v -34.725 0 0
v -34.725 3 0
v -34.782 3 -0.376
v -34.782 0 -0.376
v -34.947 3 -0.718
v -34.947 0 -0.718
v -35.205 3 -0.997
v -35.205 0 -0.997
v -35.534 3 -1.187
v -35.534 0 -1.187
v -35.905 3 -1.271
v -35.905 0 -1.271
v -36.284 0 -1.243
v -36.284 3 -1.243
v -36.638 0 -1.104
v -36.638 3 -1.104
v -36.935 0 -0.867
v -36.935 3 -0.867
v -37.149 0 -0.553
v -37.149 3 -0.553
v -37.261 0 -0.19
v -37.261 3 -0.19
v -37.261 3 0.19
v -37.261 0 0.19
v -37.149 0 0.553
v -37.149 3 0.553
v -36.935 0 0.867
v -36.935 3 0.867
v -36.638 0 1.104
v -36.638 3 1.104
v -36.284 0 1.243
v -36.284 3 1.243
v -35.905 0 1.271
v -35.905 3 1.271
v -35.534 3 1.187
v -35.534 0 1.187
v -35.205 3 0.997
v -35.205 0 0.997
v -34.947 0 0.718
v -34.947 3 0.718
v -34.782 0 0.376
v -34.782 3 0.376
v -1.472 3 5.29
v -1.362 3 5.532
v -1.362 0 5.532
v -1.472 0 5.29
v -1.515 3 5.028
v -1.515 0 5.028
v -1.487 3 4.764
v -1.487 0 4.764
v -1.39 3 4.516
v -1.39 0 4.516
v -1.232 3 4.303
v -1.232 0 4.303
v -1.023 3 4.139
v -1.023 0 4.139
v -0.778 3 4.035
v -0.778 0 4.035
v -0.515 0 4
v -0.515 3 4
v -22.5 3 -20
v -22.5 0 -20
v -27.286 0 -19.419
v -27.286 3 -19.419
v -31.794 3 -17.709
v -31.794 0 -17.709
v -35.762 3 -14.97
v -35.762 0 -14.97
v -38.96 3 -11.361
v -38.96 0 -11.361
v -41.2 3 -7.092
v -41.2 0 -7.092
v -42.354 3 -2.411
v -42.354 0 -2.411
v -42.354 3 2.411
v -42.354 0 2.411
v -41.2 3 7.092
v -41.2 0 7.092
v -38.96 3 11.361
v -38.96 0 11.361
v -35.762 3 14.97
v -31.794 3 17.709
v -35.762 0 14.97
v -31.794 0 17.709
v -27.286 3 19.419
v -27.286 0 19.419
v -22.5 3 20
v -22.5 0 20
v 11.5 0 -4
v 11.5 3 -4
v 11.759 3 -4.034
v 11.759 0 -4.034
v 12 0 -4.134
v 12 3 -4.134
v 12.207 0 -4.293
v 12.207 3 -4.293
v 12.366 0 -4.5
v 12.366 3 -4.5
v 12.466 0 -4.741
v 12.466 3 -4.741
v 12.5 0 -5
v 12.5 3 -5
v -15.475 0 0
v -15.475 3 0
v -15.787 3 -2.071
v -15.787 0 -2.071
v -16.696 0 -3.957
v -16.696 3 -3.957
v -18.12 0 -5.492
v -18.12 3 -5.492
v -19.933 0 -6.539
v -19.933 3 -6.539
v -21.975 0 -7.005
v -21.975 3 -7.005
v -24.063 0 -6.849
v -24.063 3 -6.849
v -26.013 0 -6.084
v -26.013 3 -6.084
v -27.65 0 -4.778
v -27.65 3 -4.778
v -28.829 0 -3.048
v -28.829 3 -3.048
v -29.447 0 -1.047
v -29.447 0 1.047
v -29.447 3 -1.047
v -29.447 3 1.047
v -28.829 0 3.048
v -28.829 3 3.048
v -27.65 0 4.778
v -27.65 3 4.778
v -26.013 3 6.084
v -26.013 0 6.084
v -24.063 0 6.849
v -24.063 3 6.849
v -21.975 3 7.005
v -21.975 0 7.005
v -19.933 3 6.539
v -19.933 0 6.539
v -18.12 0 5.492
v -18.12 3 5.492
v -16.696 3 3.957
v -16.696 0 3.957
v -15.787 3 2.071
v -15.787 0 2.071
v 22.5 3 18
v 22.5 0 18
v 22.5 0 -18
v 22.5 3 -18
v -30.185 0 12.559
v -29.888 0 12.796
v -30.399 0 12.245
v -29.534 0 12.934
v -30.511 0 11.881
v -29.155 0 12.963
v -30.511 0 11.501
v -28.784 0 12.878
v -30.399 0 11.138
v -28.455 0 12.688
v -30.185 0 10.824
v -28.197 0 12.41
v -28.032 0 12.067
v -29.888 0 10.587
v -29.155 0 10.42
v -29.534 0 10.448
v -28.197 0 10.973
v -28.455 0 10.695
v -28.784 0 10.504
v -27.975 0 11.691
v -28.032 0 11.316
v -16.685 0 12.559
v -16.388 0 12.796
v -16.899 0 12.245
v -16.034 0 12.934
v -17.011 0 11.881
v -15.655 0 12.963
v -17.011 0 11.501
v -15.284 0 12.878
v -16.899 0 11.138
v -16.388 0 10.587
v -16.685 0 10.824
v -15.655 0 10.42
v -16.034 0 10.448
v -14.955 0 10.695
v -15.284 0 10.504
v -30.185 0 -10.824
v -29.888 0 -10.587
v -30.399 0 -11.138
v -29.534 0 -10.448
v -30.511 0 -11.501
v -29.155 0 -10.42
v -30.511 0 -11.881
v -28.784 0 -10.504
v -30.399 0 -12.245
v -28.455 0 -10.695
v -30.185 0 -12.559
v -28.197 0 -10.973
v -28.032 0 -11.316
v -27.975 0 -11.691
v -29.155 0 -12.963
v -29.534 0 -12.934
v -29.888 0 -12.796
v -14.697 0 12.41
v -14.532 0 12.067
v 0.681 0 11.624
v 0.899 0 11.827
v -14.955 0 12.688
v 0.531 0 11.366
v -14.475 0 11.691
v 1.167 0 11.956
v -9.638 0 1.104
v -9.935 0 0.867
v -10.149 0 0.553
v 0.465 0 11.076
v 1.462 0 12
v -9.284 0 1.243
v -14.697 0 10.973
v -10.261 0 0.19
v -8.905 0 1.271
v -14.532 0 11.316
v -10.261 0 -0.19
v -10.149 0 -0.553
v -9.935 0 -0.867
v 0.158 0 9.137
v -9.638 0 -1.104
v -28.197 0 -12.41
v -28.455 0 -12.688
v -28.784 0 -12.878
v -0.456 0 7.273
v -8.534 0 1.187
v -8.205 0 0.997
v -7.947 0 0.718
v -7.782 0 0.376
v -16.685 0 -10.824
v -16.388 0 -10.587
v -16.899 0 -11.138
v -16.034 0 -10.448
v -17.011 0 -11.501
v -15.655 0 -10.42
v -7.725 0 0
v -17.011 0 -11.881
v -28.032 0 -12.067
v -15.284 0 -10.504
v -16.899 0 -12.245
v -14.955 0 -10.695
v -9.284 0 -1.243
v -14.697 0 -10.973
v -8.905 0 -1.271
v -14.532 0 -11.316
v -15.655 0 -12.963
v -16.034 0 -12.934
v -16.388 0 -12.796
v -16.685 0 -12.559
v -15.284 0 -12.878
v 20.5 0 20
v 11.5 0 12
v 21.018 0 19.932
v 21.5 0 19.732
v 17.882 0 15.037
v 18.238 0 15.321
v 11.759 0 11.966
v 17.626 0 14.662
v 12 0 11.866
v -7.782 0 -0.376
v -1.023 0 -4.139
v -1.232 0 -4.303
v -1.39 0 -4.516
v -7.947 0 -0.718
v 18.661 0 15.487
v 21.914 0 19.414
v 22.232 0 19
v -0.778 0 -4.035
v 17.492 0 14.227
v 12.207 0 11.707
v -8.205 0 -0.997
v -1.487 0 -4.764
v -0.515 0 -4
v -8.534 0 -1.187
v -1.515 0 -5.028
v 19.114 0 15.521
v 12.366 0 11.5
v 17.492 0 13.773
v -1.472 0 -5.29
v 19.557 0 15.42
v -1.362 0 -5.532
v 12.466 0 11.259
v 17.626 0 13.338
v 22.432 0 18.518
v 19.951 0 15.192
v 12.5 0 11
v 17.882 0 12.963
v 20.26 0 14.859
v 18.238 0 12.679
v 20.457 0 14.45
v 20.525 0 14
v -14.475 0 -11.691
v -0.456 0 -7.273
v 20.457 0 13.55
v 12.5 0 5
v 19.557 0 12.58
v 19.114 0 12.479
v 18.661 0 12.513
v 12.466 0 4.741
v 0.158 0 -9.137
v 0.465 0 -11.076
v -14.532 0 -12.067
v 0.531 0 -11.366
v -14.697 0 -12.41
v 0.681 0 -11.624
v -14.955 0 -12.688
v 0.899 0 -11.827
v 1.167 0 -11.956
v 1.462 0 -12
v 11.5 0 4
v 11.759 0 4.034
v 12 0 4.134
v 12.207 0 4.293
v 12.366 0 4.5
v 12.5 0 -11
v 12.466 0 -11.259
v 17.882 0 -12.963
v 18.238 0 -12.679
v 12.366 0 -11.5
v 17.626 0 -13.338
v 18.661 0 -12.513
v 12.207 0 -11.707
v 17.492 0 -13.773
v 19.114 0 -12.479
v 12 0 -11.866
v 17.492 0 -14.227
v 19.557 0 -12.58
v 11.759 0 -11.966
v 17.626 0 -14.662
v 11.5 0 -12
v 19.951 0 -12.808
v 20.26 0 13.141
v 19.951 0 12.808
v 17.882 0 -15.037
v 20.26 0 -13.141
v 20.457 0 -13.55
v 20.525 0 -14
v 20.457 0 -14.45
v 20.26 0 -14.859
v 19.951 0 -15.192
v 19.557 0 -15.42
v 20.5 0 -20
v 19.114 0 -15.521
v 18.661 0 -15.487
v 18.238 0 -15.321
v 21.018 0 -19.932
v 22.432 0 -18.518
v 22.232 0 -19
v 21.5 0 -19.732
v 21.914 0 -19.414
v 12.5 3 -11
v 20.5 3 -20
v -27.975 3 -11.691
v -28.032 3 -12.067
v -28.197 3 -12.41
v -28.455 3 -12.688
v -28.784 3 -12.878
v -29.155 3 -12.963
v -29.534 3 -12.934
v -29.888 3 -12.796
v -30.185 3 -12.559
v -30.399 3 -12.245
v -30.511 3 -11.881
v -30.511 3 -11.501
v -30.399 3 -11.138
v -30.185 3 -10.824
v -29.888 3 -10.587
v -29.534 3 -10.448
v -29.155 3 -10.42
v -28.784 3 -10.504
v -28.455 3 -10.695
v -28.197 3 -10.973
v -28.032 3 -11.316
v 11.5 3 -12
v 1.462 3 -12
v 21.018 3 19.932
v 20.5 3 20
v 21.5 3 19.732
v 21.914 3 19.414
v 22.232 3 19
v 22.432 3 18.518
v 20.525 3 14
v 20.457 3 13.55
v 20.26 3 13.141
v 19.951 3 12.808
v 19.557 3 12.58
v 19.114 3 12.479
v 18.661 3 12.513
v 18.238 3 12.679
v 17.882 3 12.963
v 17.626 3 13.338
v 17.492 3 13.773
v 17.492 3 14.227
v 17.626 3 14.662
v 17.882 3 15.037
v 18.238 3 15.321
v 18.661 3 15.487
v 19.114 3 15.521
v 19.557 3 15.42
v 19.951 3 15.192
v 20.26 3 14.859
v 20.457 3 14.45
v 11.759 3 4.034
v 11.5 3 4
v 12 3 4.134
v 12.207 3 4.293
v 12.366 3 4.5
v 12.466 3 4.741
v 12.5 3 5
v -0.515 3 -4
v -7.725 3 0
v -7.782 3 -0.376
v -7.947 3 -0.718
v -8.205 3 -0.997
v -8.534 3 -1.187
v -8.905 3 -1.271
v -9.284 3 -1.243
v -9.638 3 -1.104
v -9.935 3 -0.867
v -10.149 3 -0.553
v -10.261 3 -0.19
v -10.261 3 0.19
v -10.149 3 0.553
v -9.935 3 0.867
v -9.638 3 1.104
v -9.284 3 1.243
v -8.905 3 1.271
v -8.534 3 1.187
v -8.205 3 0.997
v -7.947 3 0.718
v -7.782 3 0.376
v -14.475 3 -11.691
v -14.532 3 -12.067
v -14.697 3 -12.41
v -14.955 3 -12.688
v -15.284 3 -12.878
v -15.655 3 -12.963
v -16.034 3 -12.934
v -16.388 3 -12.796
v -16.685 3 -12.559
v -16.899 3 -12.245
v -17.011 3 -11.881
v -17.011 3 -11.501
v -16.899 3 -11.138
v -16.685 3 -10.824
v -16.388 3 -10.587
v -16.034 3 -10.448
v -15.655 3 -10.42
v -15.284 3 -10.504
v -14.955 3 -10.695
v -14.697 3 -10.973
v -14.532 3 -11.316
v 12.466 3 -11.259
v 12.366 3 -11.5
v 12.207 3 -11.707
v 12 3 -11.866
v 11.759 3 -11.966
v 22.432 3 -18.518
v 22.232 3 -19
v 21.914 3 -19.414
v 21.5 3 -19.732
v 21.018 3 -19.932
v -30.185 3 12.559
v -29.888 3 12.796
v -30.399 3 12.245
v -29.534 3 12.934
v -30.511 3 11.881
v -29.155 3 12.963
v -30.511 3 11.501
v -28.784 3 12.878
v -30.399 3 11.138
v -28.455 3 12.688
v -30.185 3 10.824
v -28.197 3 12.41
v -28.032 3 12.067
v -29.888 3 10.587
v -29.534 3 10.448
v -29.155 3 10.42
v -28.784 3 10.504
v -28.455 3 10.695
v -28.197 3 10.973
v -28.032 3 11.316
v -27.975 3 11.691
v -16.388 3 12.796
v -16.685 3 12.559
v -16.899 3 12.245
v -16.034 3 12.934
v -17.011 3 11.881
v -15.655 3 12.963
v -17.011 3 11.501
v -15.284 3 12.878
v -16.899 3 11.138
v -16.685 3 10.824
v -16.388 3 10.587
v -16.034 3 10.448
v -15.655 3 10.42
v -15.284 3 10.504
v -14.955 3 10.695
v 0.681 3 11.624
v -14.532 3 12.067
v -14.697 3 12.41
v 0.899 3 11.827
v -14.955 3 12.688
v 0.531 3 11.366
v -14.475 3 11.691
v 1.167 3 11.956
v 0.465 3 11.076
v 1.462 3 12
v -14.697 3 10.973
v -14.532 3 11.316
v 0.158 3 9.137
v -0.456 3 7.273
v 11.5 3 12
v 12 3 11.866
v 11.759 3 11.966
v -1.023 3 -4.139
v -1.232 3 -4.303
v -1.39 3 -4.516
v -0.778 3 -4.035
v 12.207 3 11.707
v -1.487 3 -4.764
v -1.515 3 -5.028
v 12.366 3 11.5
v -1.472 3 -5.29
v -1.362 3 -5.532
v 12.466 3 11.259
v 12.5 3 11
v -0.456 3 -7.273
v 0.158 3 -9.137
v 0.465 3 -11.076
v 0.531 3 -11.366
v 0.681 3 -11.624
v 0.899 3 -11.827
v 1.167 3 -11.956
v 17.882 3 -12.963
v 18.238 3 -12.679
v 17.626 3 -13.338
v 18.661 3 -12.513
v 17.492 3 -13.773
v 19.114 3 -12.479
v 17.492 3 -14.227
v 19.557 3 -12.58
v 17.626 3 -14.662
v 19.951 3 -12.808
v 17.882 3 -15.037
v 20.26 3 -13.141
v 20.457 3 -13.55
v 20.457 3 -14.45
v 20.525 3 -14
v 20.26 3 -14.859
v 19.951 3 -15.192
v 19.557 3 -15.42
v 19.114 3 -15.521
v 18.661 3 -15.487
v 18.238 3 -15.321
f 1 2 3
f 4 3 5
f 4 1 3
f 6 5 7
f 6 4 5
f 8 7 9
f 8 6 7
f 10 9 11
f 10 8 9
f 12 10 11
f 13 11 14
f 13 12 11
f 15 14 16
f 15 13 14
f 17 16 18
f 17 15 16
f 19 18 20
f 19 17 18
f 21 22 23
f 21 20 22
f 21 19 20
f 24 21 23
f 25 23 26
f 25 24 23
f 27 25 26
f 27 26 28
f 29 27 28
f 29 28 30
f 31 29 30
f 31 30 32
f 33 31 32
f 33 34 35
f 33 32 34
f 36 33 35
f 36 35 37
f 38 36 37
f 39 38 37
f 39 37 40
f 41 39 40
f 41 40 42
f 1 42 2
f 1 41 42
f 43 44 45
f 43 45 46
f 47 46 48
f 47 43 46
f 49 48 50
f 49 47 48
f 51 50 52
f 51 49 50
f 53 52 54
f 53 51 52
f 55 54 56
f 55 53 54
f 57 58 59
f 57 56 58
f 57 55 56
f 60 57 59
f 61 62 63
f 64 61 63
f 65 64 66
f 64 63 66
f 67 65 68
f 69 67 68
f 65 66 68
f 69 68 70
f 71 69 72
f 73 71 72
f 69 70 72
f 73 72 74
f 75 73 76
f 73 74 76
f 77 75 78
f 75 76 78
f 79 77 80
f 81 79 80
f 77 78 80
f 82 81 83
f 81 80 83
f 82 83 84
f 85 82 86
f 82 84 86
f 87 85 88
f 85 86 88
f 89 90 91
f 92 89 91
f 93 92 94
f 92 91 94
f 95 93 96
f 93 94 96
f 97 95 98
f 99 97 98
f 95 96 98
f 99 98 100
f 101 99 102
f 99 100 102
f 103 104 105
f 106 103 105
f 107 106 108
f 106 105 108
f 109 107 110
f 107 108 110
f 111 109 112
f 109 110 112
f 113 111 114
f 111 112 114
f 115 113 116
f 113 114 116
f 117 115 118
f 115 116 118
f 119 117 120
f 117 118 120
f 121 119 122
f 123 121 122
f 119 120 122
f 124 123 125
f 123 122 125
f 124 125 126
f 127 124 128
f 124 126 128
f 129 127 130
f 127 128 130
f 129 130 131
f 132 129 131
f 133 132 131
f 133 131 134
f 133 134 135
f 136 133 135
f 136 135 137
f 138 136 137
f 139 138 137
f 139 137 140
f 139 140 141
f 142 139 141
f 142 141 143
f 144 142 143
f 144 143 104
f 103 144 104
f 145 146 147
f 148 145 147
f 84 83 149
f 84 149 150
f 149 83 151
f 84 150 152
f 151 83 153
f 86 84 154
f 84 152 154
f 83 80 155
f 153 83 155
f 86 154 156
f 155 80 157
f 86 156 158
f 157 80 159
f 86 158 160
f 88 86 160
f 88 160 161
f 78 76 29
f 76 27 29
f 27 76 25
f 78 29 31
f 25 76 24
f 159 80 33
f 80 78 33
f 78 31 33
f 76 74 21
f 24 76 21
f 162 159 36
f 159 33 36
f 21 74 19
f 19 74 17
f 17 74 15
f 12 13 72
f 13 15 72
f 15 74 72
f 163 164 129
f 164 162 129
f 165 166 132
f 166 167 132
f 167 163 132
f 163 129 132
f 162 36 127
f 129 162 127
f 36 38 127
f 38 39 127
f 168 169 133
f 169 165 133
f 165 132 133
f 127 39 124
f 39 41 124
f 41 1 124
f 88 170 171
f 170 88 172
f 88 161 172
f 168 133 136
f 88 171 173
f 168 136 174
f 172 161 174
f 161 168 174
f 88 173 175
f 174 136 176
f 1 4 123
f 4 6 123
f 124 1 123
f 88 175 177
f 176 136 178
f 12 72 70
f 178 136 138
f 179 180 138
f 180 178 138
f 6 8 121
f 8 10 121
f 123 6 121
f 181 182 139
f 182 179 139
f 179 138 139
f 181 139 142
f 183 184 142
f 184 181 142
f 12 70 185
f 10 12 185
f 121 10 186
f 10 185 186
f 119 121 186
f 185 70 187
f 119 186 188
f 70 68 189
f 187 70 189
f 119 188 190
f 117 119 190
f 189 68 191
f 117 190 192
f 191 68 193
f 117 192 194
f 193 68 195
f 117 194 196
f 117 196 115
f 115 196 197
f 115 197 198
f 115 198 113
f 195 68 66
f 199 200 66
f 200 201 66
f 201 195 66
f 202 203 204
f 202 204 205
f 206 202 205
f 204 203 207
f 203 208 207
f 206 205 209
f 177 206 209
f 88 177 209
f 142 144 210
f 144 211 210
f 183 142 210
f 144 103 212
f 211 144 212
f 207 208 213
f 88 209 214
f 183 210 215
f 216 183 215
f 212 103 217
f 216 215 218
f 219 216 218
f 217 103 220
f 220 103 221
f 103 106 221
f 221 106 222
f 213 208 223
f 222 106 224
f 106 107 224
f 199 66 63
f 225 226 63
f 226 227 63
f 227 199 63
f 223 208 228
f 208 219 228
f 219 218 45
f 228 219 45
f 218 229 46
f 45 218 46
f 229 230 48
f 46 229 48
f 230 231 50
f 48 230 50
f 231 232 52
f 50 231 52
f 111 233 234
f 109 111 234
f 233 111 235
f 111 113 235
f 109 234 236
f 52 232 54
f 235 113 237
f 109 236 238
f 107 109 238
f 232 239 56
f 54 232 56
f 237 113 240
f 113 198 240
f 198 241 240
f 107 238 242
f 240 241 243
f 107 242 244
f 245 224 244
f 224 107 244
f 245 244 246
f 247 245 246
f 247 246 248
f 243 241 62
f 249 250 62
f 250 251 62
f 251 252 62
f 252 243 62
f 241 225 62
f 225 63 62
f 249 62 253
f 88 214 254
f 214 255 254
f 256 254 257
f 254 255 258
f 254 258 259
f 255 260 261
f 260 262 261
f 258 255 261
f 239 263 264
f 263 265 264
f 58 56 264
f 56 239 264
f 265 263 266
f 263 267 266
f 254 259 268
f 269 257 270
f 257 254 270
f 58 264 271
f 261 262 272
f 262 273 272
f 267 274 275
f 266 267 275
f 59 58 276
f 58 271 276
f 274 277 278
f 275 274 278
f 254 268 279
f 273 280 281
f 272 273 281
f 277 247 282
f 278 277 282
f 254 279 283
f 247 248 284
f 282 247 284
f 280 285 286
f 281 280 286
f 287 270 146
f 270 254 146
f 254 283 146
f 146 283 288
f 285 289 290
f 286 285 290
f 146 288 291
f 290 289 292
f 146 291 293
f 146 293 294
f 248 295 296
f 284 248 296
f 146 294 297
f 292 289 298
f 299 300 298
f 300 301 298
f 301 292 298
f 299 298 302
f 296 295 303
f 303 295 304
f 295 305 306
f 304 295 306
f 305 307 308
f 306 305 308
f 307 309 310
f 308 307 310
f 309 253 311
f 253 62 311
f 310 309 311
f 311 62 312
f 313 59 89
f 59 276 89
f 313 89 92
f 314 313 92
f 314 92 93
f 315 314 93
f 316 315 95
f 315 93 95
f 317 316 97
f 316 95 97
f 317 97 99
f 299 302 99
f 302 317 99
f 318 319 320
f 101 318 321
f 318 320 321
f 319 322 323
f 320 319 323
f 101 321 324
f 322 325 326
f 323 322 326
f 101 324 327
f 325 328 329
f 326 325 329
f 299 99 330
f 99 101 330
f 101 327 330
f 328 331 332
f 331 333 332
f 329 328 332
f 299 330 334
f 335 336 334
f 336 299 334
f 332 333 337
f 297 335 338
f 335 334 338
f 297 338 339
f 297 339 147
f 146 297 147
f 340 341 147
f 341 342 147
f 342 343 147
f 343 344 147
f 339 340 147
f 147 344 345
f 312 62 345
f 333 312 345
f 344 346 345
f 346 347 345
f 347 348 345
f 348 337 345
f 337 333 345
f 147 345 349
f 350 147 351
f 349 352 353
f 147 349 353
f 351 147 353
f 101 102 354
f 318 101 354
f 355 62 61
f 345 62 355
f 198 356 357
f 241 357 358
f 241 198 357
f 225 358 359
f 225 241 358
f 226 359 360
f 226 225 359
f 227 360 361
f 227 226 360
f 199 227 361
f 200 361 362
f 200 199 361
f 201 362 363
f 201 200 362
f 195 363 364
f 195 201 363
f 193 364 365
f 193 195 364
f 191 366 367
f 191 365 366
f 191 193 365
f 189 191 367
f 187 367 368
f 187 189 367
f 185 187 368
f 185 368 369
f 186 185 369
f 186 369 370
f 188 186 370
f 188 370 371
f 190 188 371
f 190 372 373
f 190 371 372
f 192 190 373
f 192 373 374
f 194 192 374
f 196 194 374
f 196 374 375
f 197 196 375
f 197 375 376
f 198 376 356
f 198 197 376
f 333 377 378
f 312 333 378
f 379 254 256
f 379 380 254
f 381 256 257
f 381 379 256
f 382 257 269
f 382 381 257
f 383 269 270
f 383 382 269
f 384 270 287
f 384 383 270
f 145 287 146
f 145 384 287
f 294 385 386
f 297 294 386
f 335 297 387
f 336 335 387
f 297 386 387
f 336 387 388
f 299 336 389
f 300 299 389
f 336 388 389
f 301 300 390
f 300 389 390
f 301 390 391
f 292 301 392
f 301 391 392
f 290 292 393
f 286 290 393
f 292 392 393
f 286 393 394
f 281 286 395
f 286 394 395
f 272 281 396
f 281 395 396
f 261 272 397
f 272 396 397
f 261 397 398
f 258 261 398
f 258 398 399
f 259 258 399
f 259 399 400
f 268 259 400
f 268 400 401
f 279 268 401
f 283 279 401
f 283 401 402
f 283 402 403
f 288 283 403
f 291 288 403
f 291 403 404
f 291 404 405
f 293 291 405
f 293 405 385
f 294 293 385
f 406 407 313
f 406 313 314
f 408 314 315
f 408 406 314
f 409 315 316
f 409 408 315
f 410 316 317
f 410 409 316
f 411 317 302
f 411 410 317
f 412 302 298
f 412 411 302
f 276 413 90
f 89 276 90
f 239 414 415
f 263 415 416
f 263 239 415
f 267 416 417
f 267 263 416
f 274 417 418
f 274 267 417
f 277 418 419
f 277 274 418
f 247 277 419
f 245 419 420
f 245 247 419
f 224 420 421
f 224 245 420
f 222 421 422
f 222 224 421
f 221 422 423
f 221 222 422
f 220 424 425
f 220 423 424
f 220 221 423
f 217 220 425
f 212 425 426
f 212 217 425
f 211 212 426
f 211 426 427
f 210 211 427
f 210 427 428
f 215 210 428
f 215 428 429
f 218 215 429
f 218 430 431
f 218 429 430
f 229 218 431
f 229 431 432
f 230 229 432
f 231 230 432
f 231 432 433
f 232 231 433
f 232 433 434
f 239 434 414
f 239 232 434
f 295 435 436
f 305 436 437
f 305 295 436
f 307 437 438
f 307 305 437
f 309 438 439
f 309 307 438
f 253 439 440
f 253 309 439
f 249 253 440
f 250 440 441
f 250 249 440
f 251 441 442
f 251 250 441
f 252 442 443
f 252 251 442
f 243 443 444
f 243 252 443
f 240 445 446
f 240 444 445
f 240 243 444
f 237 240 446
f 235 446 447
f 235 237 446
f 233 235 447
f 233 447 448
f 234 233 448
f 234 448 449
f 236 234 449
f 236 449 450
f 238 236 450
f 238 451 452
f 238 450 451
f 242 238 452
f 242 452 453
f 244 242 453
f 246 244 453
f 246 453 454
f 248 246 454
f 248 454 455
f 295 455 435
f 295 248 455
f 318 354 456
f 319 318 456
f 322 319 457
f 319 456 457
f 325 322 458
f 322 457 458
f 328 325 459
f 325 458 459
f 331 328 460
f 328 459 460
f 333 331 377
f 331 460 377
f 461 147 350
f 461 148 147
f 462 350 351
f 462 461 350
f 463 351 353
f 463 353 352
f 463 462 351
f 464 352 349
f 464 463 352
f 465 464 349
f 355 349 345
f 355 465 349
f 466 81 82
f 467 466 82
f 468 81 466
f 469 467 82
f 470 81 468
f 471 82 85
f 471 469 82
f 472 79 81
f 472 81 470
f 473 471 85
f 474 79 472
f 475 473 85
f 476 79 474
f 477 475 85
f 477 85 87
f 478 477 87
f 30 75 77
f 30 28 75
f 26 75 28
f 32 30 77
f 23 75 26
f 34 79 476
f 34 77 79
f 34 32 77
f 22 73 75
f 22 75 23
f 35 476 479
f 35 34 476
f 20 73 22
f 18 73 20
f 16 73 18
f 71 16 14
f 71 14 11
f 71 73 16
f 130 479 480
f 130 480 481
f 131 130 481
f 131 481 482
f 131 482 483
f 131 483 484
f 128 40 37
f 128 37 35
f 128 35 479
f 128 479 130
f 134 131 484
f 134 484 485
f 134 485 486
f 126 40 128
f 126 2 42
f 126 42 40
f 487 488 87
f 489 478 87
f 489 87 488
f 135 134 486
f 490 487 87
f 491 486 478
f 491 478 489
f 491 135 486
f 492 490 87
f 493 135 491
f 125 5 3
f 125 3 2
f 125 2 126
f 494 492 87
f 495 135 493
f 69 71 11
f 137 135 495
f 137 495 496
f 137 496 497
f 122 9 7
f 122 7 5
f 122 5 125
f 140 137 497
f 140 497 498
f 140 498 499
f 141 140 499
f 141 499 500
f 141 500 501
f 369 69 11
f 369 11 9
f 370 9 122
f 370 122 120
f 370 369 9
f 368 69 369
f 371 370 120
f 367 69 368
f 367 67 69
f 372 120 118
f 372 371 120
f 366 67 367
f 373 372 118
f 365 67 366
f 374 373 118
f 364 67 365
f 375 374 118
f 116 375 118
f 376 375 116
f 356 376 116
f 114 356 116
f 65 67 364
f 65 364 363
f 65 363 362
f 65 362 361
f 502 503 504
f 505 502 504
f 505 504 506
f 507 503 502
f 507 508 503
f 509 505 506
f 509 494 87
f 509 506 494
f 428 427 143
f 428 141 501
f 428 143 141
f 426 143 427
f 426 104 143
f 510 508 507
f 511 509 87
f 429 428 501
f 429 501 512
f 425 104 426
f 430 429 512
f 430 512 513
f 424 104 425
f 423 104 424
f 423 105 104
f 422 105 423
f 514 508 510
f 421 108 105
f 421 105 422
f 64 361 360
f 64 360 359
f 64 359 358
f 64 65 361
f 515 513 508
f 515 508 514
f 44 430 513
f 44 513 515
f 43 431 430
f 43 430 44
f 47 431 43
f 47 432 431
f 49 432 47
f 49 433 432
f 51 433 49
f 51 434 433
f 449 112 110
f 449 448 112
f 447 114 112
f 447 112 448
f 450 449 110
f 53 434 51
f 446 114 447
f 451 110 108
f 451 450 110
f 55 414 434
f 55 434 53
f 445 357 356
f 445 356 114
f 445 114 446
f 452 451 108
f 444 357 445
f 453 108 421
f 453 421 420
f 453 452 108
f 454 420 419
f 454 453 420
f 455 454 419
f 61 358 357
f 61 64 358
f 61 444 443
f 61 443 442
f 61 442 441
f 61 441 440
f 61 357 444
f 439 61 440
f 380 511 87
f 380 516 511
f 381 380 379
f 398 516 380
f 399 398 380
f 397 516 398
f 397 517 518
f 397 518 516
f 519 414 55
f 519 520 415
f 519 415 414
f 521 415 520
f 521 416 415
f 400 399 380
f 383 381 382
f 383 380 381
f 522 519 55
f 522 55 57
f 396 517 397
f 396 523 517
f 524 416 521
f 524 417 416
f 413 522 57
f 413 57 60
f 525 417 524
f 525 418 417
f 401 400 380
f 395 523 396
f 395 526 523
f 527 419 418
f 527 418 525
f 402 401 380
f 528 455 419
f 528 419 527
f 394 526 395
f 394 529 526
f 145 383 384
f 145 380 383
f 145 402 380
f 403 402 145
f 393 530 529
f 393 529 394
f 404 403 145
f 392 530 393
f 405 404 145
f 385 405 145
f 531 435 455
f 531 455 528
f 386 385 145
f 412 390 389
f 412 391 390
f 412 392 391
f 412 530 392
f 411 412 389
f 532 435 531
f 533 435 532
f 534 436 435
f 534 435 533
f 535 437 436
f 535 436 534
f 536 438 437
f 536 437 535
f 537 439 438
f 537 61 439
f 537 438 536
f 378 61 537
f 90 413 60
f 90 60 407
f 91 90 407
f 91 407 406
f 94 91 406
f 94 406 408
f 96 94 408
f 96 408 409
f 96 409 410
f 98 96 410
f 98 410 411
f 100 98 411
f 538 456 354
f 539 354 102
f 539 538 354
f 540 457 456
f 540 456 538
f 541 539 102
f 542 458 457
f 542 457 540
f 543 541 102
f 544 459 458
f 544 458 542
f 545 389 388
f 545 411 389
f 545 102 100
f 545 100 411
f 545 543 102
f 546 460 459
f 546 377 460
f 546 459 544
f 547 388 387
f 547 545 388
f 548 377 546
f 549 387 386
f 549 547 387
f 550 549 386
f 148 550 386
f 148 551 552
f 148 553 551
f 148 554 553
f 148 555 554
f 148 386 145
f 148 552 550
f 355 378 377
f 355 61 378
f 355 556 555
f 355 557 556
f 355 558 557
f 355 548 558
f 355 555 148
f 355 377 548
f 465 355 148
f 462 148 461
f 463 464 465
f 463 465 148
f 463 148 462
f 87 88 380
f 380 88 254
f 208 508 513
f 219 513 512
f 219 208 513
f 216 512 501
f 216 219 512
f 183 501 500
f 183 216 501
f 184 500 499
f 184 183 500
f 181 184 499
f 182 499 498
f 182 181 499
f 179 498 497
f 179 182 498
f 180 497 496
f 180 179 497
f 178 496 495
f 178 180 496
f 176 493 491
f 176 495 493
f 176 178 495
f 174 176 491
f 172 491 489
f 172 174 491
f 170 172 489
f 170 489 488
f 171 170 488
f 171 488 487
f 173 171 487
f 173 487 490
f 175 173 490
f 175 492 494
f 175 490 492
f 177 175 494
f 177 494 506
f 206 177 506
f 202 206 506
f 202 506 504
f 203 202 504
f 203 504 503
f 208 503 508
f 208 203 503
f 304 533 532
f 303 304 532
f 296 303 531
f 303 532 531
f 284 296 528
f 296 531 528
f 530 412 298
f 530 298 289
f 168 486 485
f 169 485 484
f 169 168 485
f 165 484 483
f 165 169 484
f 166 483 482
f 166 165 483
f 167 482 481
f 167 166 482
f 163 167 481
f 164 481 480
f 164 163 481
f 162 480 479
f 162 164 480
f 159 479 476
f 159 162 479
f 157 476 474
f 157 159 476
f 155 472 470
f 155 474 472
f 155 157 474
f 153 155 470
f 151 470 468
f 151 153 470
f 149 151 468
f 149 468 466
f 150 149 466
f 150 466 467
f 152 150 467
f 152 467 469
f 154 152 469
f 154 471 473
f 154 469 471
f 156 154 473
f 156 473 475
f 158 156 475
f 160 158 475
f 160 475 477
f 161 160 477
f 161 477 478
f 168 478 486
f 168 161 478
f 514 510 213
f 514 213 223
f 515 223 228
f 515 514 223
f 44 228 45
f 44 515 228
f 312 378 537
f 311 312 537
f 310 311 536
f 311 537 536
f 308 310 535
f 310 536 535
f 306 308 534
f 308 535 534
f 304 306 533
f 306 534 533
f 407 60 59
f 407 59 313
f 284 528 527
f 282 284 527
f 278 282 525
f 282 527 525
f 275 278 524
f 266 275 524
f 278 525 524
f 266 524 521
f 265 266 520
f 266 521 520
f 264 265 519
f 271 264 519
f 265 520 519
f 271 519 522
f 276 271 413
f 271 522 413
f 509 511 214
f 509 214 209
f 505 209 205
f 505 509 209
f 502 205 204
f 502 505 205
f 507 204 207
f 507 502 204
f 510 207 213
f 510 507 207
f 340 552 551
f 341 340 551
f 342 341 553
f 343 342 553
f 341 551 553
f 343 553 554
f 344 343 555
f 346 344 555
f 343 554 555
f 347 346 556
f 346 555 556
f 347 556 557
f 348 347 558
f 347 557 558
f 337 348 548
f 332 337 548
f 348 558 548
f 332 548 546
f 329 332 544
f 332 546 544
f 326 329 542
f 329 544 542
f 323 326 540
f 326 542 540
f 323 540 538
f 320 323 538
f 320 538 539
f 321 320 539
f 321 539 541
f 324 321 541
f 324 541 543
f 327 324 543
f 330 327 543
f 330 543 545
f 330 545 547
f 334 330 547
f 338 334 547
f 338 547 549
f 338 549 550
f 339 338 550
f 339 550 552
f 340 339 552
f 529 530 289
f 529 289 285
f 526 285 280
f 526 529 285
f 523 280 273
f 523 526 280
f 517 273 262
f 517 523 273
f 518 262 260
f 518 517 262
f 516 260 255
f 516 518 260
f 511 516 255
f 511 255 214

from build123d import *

# Parameters (mm, degrees)
SKETCH_1_R          = 20
SKETCH_1_W          = 45
SKETCH_1_H          = 40
EXTRUDE_1_DEPTH     = 3
SKETCH_3_R          = 1.275
CUT_EXTRUDE_3_DEPTH = 4
SKETCH_6_R          = 7.025
CUT_EXTRUDE_6_DEPTH = 4
FILLET_1_R          = 2
SKETCH_7_R          = 1.525
CUT_EXTRUDE_7_DEPTH = 4
CUT_EXTRUDE_8_DEPTH = 10


with BuildPart() as part:
    # 草图1 → 凸台-拉伸1 (new body)
    with BuildSketch(Plane(origin=(0, 0, 0), x_dir=(1, 0, 0), z_dir=(0, 1, 0))):
        with Locations((-22.5, 0)):
            Circle(SKETCH_1_R)
        Rectangle(SKETCH_1_W, SKETCH_1_H)
    extrude(amount=EXTRUDE_1_DEPTH)

    # 草图3 → 切除-拉伸3 (cut, through all)
    with BuildSketch(Plane(origin=(0, 0, 0), x_dir=(1, 0, 0), z_dir=(0, 1, 0))):
        with Locations((-36, 0)):
            Circle(SKETCH_3_R)
        with Locations((-29.25, 11.691342951)):
            Circle(SKETCH_3_R)
        with Locations((-15.75, 11.691342951)):
            Circle(SKETCH_3_R)
        with Locations((-9, 0)):
            Circle(SKETCH_3_R)
        with Locations((-15.75, -11.691342951)):
            Circle(SKETCH_3_R)
        with Locations((-29.25, -11.691342951)):
            Circle(SKETCH_3_R)
    extrude(amount=CUT_EXTRUDE_3_DEPTH, mode=Mode.SUBTRACT)

    # 草图6 → 切除-拉伸6 (cut, through all)
    with BuildSketch(Plane(origin=(0, 3, 0), x_dir=(1, 0, 0), z_dir=(0, 1, 0))):
        with Locations((-22.5, 0)):
            Circle(SKETCH_6_R)
    extrude(amount=-CUT_EXTRUDE_6_DEPTH, mode=Mode.SUBTRACT)

    # 圆角1
    fillet_1_edges = [part.edges().sort_by_distance(p)[0] for p in [
        (22.5, 1.5, -20),
        (22.5, 1.5, 20),
    ]]
    fillet(fillet_1_edges, radius=FILLET_1_R)

    # 草图7 → 切除-拉伸7 (cut, through all)
    with BuildSketch(Plane(origin=(0, 3, 0), x_dir=(1, 0, 0), z_dir=(0, 1, 0))):
        with Locations((19, -14)):
            Circle(SKETCH_7_R)
        with Locations((19, 14)):
            Circle(SKETCH_7_R)
    extrude(amount=-CUT_EXTRUDE_7_DEPTH, mode=Mode.SUBTRACT)

    # 草图8 → 切除-拉伸8 (cut)
    with BuildSketch(Plane(origin=(0, 3, 0), x_dir=(1, 0, 0), z_dir=(0, 1, 0))):
        with BuildLine():
            Line((-0.51493536, -4.000000002), (11.500000002, -4.000000002))
            ThreePointArc((11.500000002, -4.000000002), (12.207106783, -4.29289322), (12.500000002, -5.000000002))
            Line((12.500000002, -5.000000002), (12.500000002, -11.000000002))
            ThreePointArc((12.500000002, -11.000000002), (12.207106783, -11.707106783), (11.500000002, -12.000000002))
            Line((11.500000002, -12.000000002), (1.461970397, -12.000000002))
            ThreePointArc((1.461970397, -12.000000002), (0.782245955, -11.733467577), (0.464858721, -11.075949369))
            ThreePointArc((0.464858721, -11.075949369), (-0.111079243, -8.192615452), (-1.361902294, -5.531645571))
            ThreePointArc((-1.361902294, -5.531645571), (-1.390048372, -4.516081398), (-0.51493536, -4.000000002))
        make_face()
    cut_extrude_8 = extrude(amount=-CUT_EXTRUDE_8_DEPTH, mode=Mode.SUBTRACT)

    # 镜向1: 切除-拉伸8 across plane
    add(cut_extrude_8.mirror(Plane.XY), mode=Mode.SUBTRACT)


solid = part.part
